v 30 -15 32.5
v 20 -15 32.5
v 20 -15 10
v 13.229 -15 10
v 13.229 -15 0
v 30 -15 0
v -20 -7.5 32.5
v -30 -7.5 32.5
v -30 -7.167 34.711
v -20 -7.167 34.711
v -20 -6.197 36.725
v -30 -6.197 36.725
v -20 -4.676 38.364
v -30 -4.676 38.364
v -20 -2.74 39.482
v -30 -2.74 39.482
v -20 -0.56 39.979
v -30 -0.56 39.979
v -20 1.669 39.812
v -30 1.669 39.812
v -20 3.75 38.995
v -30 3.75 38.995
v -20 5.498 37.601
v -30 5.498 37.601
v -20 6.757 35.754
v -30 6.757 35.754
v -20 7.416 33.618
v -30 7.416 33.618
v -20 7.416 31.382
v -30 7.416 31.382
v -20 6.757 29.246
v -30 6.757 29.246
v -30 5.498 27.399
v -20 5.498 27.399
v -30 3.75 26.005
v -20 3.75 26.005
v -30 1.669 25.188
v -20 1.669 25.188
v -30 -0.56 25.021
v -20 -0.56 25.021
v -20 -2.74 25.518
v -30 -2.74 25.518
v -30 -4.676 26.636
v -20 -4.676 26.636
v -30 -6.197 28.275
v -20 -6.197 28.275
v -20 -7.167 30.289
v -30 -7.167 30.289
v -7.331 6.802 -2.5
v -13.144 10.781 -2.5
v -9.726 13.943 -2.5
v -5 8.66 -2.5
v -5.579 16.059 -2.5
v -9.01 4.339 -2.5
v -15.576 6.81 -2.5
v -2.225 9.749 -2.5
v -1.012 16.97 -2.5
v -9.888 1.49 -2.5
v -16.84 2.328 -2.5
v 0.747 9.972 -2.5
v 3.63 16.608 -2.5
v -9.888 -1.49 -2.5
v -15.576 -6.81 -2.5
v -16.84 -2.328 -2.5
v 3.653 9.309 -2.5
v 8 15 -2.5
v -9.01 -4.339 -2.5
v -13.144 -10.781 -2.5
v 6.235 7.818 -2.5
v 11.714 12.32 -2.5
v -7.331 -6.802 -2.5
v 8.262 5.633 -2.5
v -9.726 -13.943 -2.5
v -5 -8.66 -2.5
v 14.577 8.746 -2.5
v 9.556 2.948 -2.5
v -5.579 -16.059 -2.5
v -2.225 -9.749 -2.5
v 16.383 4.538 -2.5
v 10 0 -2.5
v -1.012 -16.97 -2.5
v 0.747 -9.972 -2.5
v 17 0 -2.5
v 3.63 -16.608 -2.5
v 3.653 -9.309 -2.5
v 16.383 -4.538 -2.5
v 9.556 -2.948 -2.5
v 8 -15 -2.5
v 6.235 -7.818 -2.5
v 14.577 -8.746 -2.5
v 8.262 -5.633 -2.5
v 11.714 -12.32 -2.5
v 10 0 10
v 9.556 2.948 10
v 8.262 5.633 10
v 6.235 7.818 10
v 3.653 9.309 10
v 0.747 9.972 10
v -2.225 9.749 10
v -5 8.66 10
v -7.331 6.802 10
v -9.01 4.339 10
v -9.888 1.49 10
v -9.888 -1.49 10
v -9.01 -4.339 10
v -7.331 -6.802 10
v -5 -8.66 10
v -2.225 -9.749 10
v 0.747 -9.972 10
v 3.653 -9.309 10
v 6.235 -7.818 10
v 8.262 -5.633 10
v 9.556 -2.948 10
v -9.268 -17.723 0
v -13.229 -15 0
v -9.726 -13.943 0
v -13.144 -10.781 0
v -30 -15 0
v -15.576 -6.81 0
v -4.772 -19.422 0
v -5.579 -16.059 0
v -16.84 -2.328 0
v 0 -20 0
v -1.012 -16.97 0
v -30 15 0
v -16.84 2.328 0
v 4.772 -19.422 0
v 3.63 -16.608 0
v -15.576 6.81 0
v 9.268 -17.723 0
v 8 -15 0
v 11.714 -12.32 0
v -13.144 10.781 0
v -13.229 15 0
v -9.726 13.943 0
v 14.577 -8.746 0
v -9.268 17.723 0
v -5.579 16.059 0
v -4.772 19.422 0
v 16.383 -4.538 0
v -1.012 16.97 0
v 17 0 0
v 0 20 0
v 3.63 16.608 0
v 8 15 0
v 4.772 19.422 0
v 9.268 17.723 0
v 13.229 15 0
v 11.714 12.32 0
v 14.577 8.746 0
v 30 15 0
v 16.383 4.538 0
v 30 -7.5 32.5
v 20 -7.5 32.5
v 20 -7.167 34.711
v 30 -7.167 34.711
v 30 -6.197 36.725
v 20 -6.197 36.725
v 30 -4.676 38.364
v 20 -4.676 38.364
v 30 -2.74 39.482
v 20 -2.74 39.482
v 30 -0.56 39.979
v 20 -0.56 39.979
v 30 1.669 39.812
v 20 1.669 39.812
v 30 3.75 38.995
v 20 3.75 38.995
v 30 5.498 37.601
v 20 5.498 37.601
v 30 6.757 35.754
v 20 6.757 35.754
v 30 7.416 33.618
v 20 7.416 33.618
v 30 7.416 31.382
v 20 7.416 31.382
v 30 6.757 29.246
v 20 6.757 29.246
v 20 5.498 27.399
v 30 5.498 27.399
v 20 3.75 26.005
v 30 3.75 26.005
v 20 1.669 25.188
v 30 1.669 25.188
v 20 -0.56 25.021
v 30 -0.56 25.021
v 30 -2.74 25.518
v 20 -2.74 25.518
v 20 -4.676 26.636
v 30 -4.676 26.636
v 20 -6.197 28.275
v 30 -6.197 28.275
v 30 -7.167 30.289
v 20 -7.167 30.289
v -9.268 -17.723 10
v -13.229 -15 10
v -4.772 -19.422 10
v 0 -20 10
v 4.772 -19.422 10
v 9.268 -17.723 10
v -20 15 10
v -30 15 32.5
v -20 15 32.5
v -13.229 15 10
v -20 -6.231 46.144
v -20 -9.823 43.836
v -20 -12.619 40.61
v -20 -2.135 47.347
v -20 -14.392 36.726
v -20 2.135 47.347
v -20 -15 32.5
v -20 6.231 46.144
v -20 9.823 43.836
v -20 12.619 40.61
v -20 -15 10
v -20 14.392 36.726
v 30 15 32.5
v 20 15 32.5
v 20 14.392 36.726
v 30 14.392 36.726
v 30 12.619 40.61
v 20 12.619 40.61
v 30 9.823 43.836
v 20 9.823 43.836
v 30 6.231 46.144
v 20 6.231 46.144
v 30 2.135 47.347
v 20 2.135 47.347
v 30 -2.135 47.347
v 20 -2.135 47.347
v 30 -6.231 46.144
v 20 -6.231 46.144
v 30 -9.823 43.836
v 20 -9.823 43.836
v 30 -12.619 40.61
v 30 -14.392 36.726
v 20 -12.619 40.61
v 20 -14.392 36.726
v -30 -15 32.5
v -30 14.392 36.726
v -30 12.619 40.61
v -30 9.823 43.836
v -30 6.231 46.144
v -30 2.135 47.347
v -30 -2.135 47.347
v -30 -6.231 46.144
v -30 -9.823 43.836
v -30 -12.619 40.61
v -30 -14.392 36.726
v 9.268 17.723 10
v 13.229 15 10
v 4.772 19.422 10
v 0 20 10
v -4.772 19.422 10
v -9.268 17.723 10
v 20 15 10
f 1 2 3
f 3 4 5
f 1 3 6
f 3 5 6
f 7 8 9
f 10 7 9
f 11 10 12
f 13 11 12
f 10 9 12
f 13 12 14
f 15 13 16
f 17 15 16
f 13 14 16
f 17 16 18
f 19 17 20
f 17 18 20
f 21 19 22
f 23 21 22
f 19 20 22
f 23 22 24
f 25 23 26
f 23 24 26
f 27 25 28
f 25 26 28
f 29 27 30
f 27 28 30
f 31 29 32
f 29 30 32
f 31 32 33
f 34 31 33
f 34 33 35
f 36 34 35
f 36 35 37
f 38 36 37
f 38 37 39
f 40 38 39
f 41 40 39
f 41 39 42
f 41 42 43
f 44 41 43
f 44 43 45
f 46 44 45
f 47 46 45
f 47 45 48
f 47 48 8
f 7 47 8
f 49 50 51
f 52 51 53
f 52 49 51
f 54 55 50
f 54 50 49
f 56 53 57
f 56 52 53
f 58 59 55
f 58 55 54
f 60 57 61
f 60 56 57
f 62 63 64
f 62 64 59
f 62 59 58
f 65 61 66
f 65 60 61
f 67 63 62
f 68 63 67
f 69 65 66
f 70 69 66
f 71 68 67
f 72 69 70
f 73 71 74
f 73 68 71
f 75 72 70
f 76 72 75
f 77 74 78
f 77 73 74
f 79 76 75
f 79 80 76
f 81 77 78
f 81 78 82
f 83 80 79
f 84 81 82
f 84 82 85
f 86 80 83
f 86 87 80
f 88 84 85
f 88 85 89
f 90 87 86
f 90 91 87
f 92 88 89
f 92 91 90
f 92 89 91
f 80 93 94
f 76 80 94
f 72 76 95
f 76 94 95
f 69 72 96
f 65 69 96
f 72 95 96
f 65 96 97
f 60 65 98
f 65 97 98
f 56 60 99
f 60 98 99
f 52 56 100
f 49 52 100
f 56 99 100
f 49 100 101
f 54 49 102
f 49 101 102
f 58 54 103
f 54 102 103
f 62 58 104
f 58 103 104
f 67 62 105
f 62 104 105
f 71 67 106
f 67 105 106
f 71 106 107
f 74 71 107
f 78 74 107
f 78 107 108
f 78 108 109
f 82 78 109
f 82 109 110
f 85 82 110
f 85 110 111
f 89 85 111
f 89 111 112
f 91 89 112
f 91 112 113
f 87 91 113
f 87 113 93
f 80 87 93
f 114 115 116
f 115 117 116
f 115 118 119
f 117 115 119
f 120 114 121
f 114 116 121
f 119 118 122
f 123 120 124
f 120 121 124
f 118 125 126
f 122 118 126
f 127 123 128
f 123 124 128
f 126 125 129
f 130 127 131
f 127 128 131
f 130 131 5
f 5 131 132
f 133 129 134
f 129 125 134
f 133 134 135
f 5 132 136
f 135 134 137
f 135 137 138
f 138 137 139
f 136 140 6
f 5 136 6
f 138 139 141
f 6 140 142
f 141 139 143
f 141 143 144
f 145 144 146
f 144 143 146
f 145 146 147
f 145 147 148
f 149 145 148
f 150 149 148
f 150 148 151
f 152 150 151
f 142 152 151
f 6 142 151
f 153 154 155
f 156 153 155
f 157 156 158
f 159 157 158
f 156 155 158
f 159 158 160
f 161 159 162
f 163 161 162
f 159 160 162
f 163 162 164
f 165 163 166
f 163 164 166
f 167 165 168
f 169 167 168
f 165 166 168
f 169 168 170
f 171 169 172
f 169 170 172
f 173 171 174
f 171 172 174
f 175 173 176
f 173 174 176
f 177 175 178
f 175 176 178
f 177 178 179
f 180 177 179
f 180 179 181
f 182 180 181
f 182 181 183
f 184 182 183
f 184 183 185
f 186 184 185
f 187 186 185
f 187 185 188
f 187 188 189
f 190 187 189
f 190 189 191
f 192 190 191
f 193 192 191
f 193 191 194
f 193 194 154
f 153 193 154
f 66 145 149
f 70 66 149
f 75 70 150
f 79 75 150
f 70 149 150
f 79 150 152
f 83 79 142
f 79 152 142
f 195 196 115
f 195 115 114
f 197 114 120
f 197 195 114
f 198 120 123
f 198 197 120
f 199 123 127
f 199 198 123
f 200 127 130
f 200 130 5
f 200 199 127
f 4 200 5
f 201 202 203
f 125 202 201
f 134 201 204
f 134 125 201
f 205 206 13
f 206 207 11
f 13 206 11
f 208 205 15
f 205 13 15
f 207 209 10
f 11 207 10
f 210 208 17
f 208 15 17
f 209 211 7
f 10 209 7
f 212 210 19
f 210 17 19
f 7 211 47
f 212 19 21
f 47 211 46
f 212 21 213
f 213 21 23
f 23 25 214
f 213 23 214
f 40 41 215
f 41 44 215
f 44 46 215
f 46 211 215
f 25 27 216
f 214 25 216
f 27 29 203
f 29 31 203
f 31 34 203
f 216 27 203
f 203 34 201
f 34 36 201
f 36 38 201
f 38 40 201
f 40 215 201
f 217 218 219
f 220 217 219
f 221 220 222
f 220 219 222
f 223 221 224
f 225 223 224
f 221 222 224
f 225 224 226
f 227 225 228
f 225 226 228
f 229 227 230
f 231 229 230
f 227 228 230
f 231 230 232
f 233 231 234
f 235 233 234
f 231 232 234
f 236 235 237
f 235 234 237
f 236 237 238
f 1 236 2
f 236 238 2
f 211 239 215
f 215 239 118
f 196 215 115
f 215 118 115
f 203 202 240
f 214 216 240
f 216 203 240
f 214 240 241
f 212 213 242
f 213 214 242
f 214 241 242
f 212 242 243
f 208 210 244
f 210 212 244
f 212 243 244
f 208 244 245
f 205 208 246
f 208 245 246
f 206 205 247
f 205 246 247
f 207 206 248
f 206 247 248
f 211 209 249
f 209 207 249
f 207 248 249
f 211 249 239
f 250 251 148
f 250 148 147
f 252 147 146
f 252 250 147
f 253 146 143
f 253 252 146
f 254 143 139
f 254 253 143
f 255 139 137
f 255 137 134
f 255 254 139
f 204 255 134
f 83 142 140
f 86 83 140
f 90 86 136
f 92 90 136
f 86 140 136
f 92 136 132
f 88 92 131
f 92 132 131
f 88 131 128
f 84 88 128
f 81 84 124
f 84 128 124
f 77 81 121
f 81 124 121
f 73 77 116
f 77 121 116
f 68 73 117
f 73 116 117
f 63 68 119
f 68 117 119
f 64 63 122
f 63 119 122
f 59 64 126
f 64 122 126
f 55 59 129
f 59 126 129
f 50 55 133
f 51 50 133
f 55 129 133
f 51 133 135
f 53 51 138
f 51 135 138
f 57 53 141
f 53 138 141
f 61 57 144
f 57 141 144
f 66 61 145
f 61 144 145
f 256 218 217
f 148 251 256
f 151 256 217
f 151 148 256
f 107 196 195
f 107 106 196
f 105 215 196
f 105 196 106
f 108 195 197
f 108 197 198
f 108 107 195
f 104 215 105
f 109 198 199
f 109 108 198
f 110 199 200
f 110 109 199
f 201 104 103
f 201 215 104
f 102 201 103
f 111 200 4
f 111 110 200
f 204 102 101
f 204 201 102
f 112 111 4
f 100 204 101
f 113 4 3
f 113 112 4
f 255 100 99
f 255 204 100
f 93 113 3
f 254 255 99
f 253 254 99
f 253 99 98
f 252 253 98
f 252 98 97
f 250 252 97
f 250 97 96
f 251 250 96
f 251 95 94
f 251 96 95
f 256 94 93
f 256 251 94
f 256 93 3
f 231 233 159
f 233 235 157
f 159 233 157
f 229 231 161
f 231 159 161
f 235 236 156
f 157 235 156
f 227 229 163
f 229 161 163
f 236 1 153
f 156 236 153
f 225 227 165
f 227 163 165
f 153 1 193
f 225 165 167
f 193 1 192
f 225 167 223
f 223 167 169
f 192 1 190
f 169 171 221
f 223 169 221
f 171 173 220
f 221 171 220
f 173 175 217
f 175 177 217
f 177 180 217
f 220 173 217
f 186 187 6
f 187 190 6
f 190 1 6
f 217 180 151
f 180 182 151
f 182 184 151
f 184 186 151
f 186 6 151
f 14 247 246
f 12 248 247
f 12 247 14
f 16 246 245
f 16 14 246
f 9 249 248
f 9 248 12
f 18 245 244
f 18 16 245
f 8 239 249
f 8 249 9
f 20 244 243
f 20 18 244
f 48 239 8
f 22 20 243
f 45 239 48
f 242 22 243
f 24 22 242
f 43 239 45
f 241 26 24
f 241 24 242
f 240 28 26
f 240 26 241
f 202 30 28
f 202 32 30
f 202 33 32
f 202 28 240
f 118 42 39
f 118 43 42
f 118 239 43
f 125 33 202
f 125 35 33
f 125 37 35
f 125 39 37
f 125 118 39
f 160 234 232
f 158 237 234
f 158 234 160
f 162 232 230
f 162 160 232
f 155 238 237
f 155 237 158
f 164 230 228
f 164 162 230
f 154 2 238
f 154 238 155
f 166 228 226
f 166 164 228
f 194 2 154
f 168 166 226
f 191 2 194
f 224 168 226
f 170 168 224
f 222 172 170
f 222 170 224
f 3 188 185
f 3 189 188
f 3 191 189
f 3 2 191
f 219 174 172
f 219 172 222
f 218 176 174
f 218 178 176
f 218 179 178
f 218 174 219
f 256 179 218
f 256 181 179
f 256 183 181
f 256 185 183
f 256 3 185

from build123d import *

# Parameters (mm, degrees)
F0_W      = 60
F0_H      = 30
F1_DEPTH  = 10
F2_W      = 10
F2_H      = 30
F3_DEPTH  = 37.5
F5_DEPTH  = 60.001
F6_R      = 7.5
F7_DEPTH  = 60.001
F9_DEPTH  = 2.5
F11_DEPTH = 10
F12_R     = 10
F13_DEPTH = 25


with BuildPart() as f1:
    # F0 (on Top) → F1 (new body)
    with BuildSketch(Plane.XY):
        Rectangle(F0_W, F0_H)
    extrude(amount=F1_DEPTH)

    # F2 (on face) → F3 (join)
    with BuildSketch(Plane.XY.offset(10)):
        with Locations((-25, 0)):
            Rectangle(F2_W, F2_H)
        with Locations((25, 0)):
            Rectangle(F2_W, F2_H)
    extrude(amount=F3_DEPTH)

    # F4 (on face) → F5 (cut, through all)
    with BuildSketch(Plane(origin=(-30, 0, 0), x_dir=(0, -1, 0), z_dir=(-1, 0, 0))):
        with BuildLine():
            ThreePointArc((-15, 32.5), (-10.6066017178, 43.1066017178), (0, 47.5))
            Line((0, 47.5), (-15, 47.5))
            Line((-15, 47.5), (-15, 32.5))
        make_face()
        with BuildLine():
            ThreePointArc((0, 47.5), (10.6066017178, 43.1066017178), (15, 32.5))
            Line((15, 32.5), (15, 47.5))
            Line((15, 47.5), (0, 47.5))
        make_face()
    extrude(amount=-F5_DEPTH, mode=Mode.SUBTRACT)

    # F6 (on face) → F7 (cut, through all)
    with BuildSketch(Plane(origin=(-30, 0, 0), x_dir=(0, -1, 0), z_dir=(-1, 0, 0))):
        with Locations((0, 32.5)):
            Circle(F6_R)
    extrude(amount=-F7_DEPTH, mode=Mode.SUBTRACT)

    # F8 (on face) → F9 (join)
    with BuildSketch(Plane(origin=(0, 0, 0), x_dir=(1, 0, 0), z_dir=(0, 0, -1))):
        with BuildLine():
            Line((-8, 15), (8, 15))
            ThreePointArc((8, 15), (0, 17), (-8, 15))
        make_face()
        with BuildLine():
            ThreePointArc((8, -15), (14.5773797371, -8.7464278423), (17, 0))
            ThreePointArc((17, 0), (14.5773797371, 8.7464278423), (8, 15))
            Line((8, 15), (-8, 15))
            ThreePointArc((-8, 15), (-17, 0), (-8, -15))
            Line((-8, -15), (8, -15))
        make_face()
        with BuildLine():
            ThreePointArc((-8, -15), (0, -17), (8, -15))
            Line((8, -15), (-8, -15))
        make_face()
    extrude(amount=F9_DEPTH)

    # F10 (on face) → F11 (join)
    with BuildSketch(Plane.XY.offset(10)):
        with BuildLine():
            Line((-13.2287565553, 15), (13.2287565553, 15))
            ThreePointArc((13.2287565553, 15), (0, 20), (-13.2287565553, 15))
        make_face()
        with BuildLine():
            Line((13.2287565553, -15), (-13.2287565553, -15))
            ThreePointArc((-13.2287565553, -15), (0, -20), (13.2287565553, -15))
        make_face()
    extrude(amount=-F11_DEPTH)

    # F12 (on face) → F13 (cut)
    with BuildSketch(Plane.XY.offset(10)):
        Circle(F12_R)
    extrude(amount=-F13_DEPTH, mode=Mode.SUBTRACT)


solid = f1.part
